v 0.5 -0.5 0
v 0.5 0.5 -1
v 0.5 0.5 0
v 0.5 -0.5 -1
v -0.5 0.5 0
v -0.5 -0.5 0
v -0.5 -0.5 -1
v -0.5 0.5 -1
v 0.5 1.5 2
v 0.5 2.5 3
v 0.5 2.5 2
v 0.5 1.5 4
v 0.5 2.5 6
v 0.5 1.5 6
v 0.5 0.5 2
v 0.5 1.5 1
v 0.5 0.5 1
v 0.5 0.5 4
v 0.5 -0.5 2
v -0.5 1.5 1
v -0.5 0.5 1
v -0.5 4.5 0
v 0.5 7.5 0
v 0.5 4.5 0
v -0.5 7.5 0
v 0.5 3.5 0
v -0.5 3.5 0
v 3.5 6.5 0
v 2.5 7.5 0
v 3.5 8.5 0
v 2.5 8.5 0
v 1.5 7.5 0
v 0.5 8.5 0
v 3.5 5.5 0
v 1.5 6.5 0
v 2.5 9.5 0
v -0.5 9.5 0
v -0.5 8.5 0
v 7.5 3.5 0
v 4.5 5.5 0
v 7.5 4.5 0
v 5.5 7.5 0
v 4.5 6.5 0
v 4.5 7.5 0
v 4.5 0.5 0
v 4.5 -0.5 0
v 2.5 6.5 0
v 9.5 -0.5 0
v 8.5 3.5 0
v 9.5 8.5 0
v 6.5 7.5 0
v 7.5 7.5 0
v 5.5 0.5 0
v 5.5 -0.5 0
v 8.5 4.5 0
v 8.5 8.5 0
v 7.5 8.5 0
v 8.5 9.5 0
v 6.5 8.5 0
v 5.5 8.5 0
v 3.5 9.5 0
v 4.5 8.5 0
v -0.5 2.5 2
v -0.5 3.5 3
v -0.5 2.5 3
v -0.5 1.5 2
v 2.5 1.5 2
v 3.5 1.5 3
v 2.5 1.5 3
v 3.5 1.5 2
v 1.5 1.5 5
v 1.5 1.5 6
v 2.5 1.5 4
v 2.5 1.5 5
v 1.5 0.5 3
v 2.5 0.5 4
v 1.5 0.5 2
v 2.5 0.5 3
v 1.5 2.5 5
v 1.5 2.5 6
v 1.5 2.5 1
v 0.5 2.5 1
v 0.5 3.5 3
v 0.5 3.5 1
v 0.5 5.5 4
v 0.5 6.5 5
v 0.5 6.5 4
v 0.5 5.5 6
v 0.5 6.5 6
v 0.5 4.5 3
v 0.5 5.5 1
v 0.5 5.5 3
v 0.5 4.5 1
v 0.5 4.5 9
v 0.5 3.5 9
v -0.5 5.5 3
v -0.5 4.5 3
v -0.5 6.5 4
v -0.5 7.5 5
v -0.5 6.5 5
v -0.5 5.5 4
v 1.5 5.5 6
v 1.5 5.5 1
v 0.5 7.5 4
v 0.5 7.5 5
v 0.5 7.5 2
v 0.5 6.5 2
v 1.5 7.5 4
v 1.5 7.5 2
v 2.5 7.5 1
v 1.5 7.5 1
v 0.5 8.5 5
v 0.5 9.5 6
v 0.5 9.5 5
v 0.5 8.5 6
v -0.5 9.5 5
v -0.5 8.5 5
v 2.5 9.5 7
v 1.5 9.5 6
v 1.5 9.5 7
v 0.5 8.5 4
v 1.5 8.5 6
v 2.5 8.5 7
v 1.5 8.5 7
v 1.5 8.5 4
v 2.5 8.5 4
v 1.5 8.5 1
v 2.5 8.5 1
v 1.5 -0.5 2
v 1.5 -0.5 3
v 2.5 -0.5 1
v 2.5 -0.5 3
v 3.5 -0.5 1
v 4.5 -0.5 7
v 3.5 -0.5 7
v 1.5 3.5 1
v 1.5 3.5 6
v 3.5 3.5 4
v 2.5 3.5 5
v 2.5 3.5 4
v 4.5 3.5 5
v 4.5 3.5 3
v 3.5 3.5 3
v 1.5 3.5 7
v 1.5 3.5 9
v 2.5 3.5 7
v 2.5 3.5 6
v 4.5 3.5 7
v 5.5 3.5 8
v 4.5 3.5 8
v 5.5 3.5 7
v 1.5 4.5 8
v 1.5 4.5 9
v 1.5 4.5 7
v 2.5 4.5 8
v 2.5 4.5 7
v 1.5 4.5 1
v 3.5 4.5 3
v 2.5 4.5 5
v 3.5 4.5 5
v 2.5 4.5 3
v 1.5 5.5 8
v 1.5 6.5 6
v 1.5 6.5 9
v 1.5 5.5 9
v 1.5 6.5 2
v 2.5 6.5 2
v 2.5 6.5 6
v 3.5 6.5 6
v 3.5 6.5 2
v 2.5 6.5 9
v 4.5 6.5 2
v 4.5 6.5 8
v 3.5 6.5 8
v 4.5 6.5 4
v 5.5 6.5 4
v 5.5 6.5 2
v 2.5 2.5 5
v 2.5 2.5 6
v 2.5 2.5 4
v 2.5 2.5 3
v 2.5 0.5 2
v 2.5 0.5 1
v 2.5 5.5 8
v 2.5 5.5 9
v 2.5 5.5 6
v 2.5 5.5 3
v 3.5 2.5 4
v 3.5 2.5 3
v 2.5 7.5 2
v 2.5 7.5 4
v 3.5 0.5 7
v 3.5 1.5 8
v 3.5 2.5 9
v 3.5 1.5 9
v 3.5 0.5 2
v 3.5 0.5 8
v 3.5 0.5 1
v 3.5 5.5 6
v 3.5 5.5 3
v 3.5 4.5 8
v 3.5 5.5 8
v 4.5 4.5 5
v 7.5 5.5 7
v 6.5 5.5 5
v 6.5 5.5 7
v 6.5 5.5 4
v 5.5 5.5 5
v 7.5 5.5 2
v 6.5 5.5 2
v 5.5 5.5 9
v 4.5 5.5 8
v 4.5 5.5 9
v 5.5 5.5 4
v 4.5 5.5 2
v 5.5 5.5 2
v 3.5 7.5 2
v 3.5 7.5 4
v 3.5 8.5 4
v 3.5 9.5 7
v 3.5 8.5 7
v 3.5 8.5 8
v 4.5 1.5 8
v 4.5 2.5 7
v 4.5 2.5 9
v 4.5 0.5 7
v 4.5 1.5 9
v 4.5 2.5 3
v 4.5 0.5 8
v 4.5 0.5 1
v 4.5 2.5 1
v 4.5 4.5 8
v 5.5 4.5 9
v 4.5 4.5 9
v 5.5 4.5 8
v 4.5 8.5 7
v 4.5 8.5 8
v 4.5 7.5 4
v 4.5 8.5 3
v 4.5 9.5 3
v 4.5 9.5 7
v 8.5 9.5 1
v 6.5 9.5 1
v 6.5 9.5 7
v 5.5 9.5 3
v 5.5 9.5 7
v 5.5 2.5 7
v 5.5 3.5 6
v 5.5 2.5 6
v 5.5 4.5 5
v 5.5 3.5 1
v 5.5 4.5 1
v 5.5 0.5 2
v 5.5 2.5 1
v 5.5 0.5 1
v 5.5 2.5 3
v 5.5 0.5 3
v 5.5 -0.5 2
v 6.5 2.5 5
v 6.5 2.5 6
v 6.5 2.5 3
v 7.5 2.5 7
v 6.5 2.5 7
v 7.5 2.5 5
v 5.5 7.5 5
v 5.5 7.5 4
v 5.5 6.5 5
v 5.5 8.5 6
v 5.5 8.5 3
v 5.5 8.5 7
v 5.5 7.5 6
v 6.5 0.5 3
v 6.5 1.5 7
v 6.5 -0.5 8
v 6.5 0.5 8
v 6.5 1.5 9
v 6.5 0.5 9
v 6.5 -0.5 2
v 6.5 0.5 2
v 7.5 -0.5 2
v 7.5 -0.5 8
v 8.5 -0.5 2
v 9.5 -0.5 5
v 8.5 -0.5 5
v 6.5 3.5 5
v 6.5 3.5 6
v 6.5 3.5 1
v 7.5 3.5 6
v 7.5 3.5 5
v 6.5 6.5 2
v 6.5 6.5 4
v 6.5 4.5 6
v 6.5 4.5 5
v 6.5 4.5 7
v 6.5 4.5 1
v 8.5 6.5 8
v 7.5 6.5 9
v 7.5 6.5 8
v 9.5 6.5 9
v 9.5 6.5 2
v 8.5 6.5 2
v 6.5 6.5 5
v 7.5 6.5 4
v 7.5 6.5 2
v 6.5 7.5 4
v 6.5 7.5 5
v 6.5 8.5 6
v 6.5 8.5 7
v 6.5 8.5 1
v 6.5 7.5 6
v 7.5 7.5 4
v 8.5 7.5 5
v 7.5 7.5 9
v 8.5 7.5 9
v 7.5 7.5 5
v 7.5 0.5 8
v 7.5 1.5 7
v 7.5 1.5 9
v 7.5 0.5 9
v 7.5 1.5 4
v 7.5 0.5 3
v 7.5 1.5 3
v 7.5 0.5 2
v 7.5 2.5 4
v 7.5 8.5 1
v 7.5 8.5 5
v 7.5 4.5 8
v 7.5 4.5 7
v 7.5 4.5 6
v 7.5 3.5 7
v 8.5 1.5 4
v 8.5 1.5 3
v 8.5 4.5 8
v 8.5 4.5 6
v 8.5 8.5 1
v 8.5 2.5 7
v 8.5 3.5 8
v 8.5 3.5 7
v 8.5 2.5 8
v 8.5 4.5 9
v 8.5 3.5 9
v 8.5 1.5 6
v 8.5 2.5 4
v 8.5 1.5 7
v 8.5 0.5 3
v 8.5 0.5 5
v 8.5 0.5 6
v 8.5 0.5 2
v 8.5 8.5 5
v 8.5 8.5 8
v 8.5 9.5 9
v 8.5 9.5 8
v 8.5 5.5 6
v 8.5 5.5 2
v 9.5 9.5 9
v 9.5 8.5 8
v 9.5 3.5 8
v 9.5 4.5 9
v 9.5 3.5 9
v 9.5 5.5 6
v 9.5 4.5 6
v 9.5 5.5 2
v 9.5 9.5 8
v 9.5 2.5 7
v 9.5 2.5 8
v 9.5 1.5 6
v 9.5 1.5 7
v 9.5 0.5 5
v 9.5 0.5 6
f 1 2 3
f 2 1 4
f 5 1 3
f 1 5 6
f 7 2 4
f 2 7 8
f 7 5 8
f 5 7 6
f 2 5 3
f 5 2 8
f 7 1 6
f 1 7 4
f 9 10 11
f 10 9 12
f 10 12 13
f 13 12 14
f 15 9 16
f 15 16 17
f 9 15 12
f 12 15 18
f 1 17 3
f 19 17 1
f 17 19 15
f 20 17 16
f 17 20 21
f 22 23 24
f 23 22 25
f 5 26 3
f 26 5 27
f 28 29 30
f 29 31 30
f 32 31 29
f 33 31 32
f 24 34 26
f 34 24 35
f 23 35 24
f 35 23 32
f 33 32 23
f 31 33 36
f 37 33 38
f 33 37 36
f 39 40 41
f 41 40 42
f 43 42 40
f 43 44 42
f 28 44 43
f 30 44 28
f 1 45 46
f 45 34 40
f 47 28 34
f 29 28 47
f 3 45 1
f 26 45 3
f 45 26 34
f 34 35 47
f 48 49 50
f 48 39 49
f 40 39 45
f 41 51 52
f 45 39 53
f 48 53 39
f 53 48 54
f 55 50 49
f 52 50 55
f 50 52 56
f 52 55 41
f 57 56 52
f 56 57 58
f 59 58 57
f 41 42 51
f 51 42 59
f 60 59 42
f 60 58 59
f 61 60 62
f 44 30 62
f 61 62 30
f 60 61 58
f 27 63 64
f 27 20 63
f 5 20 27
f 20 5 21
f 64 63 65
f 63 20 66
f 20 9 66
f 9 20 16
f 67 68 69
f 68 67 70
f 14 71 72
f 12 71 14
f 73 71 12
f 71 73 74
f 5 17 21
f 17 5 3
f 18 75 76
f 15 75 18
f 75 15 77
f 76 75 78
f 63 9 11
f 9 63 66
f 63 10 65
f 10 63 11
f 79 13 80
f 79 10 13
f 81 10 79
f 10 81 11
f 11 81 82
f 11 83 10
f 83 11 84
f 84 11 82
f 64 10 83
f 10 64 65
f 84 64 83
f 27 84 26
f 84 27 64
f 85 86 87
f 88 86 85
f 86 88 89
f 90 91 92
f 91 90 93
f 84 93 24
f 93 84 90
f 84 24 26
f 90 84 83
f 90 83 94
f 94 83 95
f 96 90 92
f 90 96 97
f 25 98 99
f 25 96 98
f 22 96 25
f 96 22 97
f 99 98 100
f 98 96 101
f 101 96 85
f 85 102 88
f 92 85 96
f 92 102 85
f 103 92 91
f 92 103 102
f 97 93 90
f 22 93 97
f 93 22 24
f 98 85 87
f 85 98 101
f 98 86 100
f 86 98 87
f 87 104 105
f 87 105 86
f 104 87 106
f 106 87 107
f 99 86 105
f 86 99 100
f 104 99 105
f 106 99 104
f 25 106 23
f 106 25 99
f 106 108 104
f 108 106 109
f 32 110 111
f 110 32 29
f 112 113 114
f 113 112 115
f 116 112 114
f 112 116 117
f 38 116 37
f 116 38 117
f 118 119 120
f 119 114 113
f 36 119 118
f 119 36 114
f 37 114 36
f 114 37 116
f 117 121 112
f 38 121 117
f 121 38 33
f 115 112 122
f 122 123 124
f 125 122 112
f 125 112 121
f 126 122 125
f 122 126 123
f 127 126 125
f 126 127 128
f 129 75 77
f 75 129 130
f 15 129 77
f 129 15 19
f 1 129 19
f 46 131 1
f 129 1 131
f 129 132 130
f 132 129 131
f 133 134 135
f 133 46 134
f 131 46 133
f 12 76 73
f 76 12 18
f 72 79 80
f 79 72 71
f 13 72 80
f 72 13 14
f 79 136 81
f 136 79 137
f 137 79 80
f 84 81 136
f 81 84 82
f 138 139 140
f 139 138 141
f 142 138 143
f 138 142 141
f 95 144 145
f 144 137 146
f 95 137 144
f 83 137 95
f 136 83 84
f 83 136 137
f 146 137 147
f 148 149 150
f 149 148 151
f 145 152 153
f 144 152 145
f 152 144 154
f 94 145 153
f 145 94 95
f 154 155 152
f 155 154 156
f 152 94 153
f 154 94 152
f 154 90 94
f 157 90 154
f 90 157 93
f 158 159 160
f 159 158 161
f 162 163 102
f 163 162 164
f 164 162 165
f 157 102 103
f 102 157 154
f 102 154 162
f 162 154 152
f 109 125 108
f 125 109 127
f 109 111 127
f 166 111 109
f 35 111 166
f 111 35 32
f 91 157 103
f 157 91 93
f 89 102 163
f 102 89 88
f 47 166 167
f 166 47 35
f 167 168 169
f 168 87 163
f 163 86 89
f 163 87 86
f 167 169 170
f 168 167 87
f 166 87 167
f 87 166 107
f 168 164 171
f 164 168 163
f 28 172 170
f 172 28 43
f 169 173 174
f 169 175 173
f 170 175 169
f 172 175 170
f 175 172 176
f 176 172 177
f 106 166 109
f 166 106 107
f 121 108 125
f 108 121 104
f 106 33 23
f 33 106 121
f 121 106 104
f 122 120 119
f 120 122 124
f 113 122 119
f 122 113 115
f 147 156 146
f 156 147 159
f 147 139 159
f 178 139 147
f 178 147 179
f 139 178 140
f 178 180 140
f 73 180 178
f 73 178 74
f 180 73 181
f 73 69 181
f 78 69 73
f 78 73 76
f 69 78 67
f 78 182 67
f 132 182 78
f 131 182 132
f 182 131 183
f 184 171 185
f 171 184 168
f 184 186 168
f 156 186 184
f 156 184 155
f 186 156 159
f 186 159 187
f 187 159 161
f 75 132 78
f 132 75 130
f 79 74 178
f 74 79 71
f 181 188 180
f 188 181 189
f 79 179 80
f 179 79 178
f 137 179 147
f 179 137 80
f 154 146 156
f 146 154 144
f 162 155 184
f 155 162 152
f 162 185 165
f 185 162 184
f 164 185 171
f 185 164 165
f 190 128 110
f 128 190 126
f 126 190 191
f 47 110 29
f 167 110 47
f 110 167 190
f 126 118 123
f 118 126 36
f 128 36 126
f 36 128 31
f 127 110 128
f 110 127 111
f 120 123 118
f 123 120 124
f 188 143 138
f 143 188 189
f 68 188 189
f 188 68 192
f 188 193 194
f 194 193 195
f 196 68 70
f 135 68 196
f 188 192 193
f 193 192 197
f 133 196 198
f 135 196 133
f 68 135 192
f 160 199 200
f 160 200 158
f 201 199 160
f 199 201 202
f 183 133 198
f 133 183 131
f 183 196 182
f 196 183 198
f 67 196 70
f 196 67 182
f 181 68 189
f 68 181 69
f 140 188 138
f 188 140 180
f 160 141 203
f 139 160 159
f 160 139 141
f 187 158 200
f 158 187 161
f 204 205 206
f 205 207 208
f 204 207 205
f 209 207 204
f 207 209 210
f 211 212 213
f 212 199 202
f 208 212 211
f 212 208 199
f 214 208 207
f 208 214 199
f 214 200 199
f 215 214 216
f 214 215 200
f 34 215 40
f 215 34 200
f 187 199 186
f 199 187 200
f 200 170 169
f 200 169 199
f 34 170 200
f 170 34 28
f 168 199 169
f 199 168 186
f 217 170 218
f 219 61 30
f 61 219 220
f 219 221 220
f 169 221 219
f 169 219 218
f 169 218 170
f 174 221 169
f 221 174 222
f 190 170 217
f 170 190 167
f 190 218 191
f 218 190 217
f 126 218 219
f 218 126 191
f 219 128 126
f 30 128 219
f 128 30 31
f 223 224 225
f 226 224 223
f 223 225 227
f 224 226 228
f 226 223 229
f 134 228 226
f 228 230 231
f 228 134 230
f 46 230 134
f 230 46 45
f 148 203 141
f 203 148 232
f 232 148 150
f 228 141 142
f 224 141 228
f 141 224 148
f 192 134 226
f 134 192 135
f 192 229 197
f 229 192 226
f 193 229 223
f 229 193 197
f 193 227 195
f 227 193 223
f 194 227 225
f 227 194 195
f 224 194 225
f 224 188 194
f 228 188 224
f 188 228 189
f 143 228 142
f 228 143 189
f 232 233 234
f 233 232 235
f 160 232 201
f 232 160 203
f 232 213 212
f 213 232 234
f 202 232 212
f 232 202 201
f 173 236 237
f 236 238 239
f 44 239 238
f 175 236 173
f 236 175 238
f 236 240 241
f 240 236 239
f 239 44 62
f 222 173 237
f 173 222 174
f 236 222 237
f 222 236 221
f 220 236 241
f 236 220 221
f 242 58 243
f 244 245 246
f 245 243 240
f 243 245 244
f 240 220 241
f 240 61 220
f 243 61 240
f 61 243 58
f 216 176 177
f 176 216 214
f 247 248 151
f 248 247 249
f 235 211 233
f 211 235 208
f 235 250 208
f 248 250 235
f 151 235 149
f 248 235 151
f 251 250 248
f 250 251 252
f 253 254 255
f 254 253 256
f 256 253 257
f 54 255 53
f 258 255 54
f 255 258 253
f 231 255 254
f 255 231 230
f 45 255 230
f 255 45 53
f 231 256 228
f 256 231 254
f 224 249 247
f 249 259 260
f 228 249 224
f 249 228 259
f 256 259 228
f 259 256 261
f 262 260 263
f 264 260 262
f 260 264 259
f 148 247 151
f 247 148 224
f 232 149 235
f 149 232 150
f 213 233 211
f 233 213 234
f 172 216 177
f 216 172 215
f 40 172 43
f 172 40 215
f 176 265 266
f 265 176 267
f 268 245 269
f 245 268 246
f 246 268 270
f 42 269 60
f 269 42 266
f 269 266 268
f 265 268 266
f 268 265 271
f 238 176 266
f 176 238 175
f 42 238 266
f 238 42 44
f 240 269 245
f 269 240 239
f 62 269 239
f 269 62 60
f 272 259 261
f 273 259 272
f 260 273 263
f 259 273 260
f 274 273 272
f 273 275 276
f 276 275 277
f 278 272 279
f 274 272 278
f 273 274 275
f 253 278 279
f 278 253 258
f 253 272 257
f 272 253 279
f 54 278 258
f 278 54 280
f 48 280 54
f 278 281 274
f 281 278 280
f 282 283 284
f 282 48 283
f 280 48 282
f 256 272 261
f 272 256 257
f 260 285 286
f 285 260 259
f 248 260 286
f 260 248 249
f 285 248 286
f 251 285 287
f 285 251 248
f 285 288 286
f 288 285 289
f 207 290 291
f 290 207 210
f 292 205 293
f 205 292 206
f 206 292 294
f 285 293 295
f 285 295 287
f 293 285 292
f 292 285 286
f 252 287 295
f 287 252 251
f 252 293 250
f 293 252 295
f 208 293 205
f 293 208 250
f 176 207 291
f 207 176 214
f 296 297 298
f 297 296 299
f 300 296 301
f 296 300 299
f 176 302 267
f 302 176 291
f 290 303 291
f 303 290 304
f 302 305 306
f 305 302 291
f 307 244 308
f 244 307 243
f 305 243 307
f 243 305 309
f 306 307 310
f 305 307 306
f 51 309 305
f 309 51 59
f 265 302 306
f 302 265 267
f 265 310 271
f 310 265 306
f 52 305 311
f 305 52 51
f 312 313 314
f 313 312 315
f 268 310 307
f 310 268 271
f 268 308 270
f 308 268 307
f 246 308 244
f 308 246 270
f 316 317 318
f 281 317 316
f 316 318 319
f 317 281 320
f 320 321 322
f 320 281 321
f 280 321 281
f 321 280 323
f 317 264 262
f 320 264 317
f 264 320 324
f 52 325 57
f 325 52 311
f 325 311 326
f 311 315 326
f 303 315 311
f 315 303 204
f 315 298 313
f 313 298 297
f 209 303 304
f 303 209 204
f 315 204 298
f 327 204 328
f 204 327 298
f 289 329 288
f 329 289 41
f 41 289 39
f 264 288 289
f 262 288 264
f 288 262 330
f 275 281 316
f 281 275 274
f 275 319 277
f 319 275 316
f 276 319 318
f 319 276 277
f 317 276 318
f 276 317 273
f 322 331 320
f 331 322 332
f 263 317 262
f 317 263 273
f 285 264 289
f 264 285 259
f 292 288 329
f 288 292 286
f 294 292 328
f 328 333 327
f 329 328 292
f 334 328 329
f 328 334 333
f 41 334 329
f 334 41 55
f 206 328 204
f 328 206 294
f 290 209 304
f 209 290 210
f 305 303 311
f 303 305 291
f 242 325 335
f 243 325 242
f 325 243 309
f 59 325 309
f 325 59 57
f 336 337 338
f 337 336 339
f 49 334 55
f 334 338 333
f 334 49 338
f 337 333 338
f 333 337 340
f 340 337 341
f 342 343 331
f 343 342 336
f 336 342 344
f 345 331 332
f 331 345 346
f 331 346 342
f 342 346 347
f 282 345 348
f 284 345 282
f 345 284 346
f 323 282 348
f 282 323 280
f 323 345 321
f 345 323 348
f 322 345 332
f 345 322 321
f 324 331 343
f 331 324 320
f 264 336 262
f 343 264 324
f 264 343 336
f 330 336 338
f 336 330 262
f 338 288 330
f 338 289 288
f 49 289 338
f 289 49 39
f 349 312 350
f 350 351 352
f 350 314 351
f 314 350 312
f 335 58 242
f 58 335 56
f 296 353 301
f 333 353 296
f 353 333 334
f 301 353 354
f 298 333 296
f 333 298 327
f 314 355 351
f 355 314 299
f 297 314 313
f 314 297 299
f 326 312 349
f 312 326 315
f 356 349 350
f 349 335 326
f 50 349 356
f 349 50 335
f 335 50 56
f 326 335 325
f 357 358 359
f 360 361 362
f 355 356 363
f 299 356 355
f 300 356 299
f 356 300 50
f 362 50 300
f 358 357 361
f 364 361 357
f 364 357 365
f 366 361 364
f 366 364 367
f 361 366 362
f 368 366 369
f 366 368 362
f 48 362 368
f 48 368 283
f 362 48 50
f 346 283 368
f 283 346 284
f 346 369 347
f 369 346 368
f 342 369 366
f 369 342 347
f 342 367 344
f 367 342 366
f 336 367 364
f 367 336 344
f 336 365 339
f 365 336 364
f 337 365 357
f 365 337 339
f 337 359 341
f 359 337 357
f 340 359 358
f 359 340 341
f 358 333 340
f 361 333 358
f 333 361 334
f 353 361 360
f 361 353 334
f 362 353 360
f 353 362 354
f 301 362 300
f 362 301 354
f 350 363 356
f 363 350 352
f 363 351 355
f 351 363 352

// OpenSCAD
union() {
    translate([0, 0, -0.5]) color([1, 0, 0]) cube([1, 1, 1], center=true);
    translate([0, 1, 0.5]) cube([1, 1, 1], center=true);
    translate([0, 2, 1.0]) cube([1, 1, 2], center=true);
    translate([0, 3, 1.5]) cube([1, 1, 3], center=true);
    translate([0, 5, 1.5]) cube([1, 1, 3], center=true);
    translate([0, 6, 2.0]) cube([1, 1, 4], center=true);
    translate([0, 7, 2.5]) cube([1, 1, 5], center=true);
    translate([0, 9, 2.5]) cube([1, 1, 5], center=true);
    translate([1, 0, 1.0]) cube([1, 1, 2], center=true);
    translate([1, 1, 2.0]) cube([1, 1, 4], center=true);
    translate([1, 2, 3.0]) cube([1, 1, 6], center=true);
    translate([1, 3, 0.5]) cube([1, 1, 1], center=true);
    translate([1, 4, 4.5]) cube([1, 1, 9], center=true);
    translate([1, 5, 0.5]) cube([1, 1, 1], center=true);
    translate([1, 6, 3.0]) cube([1, 1, 6], center=true);
    translate([1, 7, 1.0]) cube([1, 1, 2], center=true);
    translate([1, 8, 2.0]) cube([1, 1, 4], center=true);
    translate([1, 9, 3.0]) cube([1, 1, 6], center=true);
    translate([2, 0, 1.5]) cube([1, 1, 3], center=true);
    translate([2, 1, 2.0]) cube([1, 1, 4], center=true);
    translate([2, 2, 2.5]) cube([1, 1, 5], center=true);
    translate([2, 3, 3.0]) cube([1, 1, 6], center=true);
    translate([2, 4, 3.5]) cube([1, 1, 7], center=true);
    translate([2, 5, 4.0]) cube([1, 1, 8], center=true);
    translate([2, 6, 4.5]) cube([1, 1, 9], center=true);
    translate([2, 8, 0.5]) cube([1, 1, 1], center=true);
    translate([2, 9, 3.5]) cube([1, 1, 7], center=true);
    translate([3, 0, 0.5]) cube([1, 1, 1], center=true);
    translate([3, 1, 1.0]) cube([1, 1, 2], center=true);
    translate([3, 2, 1.5]) cube([1, 1, 3], center=true);
    translate([3, 3, 2.0]) cube([1, 1, 4], center=true);
    translate([3, 4, 2.5]) cube([1, 1, 5], center=true);
    translate([3, 5, 1.5]) cube([1, 1, 3], center=true);
    translate([3, 6, 3.0]) cube([1, 1, 6], center=true);
    translate([3, 7, 1.0]) cube([1, 1, 2], center=true);
    translate([3, 8, 2.0]) cube([1, 1, 4], center=true);
    translate([4, 0, 3.5]) cube([1, 1, 7], center=true);
    translate([4, 1, 4.0]) cube([1, 1, 8], center=true);
    translate([4, 2, 4.5]) cube([1, 1, 9], center=true);
    translate([4, 3, 1.5]) cube([1, 1, 3], center=true);
    translate([4, 4, 2.5]) cube([1, 1, 5], center=true);
    translate([4, 5, 4.0]) cube([1, 1, 8], center=true);
    translate([4, 7, 4.0]) cube([1, 1, 8], center=true);
    translate([4, 8, 4.0]) cube([1, 1, 8], center=true);
    translate([4, 9, 3.5]) cube([1, 1, 7], center=true);
    translate([5, 1, 0.5]) cube([1, 1, 1], center=true);
    translate([5, 2, 0.5]) cube([1, 1, 1], center=true);
    translate([5, 3, 3.5]) cube([1, 1, 7], center=true);
    translate([5, 4, 4.0]) cube([1, 1, 8], center=true);
    translate([5, 5, 4.5]) cube([1, 1, 9], center=true);
    translate([5, 6, 1.0]) cube([1, 1, 2], center=true);
    translate([5, 7, 2.0]) cube([1, 1, 4], center=true);
    translate([5, 9, 1.5]) cube([1, 1, 3], center=true);
    translate([6, 0, 1.0]) cube([1, 1, 2], center=true);
    translate([6, 1, 1.5]) cube([1, 1, 3], center=true);
    translate([6, 2, 1.5]) cube([1, 1, 3], center=true);
    translate([6, 3, 3.0]) cube([1, 1, 6], center=true);
    translate([6, 4, 0.5]) cube([1, 1, 1], center=true);
    translate([6, 5, 2.5]) cube([1, 1, 5], center=true);
    translate([6, 6, 2.0]) cube([1, 1, 4], center=true);
    translate([6, 7, 2.5]) cube([1, 1, 5], center=true);
    translate([6, 8, 3.0]) cube([1, 1, 6], center=true);
    translate([6, 9, 3.5]) cube([1, 1, 7], center=true);
    translate([7, 0, 4.0]) cube([1, 1, 8], center=true);
    translate([7, 1, 4.5]) cube([1, 1, 9], center=true);
    translate([7, 2, 3.5]) cube([1, 1, 7], center=true);
    translate([7, 3, 2.5]) cube([1, 1, 5], center=true);
    translate([7, 4, 3.0]) cube([1, 1, 6], center=true);
    translate([7, 5, 3.5]) cube([1, 1, 7], center=true);
    translate([7, 6, 1.0]) cube([1, 1, 2], center=true);
    translate([7, 7, 2.0]) cube([1, 1, 4], center=true);
    translate([7, 9, 0.5]) cube([1, 1, 1], center=true);
    translate([8, 0, 1.0]) cube([1, 1, 2], center=true);
    translate([8, 1, 1.5]) cube([1, 1, 3], center=true);
    translate([8, 2, 2.0]) cube([1, 1, 4], center=true);
    translate([8, 3, 3.5]) cube([1, 1, 7], center=true);
    translate([8, 5, 4.0]) cube([1, 1, 8], center=true);
    translate([8, 6, 4.0]) cube([1, 1, 8], center=true);
    translate([8, 7, 4.5]) cube([1, 1, 9], center=true);
    translate([8, 8, 2.5]) cube([1, 1, 5], center=true);
    translate([8, 9, 0.5]) cube([1, 1, 1], center=true);
    translate([9, 0, 2.5]) cube([1, 1, 5], center=true);
    translate([9, 1, 3.0]) cube([1, 1, 6], center=true);
    translate([9, 2, 3.5]) cube([1, 1, 7], center=true);
    translate([9, 3, 4.0]) cube([1, 1, 8], center=true);
    translate([9, 4, 4.5]) cube([1, 1, 9], center=true);
    translate([9, 5, 3.0]) cube([1, 1, 6], center=true);
    translate([9, 6, 1.0]) cube([1, 1, 2], center=true);
    translate([9, 7, 4.5]) cube([1, 1, 9], center=true);
    translate([9, 8, 4.5]) cube([1, 1, 9], center=true);
    translate([9, 9, 8.5]) color([0, 0, 1]) cube([1, 1, 1], center=true);
}
